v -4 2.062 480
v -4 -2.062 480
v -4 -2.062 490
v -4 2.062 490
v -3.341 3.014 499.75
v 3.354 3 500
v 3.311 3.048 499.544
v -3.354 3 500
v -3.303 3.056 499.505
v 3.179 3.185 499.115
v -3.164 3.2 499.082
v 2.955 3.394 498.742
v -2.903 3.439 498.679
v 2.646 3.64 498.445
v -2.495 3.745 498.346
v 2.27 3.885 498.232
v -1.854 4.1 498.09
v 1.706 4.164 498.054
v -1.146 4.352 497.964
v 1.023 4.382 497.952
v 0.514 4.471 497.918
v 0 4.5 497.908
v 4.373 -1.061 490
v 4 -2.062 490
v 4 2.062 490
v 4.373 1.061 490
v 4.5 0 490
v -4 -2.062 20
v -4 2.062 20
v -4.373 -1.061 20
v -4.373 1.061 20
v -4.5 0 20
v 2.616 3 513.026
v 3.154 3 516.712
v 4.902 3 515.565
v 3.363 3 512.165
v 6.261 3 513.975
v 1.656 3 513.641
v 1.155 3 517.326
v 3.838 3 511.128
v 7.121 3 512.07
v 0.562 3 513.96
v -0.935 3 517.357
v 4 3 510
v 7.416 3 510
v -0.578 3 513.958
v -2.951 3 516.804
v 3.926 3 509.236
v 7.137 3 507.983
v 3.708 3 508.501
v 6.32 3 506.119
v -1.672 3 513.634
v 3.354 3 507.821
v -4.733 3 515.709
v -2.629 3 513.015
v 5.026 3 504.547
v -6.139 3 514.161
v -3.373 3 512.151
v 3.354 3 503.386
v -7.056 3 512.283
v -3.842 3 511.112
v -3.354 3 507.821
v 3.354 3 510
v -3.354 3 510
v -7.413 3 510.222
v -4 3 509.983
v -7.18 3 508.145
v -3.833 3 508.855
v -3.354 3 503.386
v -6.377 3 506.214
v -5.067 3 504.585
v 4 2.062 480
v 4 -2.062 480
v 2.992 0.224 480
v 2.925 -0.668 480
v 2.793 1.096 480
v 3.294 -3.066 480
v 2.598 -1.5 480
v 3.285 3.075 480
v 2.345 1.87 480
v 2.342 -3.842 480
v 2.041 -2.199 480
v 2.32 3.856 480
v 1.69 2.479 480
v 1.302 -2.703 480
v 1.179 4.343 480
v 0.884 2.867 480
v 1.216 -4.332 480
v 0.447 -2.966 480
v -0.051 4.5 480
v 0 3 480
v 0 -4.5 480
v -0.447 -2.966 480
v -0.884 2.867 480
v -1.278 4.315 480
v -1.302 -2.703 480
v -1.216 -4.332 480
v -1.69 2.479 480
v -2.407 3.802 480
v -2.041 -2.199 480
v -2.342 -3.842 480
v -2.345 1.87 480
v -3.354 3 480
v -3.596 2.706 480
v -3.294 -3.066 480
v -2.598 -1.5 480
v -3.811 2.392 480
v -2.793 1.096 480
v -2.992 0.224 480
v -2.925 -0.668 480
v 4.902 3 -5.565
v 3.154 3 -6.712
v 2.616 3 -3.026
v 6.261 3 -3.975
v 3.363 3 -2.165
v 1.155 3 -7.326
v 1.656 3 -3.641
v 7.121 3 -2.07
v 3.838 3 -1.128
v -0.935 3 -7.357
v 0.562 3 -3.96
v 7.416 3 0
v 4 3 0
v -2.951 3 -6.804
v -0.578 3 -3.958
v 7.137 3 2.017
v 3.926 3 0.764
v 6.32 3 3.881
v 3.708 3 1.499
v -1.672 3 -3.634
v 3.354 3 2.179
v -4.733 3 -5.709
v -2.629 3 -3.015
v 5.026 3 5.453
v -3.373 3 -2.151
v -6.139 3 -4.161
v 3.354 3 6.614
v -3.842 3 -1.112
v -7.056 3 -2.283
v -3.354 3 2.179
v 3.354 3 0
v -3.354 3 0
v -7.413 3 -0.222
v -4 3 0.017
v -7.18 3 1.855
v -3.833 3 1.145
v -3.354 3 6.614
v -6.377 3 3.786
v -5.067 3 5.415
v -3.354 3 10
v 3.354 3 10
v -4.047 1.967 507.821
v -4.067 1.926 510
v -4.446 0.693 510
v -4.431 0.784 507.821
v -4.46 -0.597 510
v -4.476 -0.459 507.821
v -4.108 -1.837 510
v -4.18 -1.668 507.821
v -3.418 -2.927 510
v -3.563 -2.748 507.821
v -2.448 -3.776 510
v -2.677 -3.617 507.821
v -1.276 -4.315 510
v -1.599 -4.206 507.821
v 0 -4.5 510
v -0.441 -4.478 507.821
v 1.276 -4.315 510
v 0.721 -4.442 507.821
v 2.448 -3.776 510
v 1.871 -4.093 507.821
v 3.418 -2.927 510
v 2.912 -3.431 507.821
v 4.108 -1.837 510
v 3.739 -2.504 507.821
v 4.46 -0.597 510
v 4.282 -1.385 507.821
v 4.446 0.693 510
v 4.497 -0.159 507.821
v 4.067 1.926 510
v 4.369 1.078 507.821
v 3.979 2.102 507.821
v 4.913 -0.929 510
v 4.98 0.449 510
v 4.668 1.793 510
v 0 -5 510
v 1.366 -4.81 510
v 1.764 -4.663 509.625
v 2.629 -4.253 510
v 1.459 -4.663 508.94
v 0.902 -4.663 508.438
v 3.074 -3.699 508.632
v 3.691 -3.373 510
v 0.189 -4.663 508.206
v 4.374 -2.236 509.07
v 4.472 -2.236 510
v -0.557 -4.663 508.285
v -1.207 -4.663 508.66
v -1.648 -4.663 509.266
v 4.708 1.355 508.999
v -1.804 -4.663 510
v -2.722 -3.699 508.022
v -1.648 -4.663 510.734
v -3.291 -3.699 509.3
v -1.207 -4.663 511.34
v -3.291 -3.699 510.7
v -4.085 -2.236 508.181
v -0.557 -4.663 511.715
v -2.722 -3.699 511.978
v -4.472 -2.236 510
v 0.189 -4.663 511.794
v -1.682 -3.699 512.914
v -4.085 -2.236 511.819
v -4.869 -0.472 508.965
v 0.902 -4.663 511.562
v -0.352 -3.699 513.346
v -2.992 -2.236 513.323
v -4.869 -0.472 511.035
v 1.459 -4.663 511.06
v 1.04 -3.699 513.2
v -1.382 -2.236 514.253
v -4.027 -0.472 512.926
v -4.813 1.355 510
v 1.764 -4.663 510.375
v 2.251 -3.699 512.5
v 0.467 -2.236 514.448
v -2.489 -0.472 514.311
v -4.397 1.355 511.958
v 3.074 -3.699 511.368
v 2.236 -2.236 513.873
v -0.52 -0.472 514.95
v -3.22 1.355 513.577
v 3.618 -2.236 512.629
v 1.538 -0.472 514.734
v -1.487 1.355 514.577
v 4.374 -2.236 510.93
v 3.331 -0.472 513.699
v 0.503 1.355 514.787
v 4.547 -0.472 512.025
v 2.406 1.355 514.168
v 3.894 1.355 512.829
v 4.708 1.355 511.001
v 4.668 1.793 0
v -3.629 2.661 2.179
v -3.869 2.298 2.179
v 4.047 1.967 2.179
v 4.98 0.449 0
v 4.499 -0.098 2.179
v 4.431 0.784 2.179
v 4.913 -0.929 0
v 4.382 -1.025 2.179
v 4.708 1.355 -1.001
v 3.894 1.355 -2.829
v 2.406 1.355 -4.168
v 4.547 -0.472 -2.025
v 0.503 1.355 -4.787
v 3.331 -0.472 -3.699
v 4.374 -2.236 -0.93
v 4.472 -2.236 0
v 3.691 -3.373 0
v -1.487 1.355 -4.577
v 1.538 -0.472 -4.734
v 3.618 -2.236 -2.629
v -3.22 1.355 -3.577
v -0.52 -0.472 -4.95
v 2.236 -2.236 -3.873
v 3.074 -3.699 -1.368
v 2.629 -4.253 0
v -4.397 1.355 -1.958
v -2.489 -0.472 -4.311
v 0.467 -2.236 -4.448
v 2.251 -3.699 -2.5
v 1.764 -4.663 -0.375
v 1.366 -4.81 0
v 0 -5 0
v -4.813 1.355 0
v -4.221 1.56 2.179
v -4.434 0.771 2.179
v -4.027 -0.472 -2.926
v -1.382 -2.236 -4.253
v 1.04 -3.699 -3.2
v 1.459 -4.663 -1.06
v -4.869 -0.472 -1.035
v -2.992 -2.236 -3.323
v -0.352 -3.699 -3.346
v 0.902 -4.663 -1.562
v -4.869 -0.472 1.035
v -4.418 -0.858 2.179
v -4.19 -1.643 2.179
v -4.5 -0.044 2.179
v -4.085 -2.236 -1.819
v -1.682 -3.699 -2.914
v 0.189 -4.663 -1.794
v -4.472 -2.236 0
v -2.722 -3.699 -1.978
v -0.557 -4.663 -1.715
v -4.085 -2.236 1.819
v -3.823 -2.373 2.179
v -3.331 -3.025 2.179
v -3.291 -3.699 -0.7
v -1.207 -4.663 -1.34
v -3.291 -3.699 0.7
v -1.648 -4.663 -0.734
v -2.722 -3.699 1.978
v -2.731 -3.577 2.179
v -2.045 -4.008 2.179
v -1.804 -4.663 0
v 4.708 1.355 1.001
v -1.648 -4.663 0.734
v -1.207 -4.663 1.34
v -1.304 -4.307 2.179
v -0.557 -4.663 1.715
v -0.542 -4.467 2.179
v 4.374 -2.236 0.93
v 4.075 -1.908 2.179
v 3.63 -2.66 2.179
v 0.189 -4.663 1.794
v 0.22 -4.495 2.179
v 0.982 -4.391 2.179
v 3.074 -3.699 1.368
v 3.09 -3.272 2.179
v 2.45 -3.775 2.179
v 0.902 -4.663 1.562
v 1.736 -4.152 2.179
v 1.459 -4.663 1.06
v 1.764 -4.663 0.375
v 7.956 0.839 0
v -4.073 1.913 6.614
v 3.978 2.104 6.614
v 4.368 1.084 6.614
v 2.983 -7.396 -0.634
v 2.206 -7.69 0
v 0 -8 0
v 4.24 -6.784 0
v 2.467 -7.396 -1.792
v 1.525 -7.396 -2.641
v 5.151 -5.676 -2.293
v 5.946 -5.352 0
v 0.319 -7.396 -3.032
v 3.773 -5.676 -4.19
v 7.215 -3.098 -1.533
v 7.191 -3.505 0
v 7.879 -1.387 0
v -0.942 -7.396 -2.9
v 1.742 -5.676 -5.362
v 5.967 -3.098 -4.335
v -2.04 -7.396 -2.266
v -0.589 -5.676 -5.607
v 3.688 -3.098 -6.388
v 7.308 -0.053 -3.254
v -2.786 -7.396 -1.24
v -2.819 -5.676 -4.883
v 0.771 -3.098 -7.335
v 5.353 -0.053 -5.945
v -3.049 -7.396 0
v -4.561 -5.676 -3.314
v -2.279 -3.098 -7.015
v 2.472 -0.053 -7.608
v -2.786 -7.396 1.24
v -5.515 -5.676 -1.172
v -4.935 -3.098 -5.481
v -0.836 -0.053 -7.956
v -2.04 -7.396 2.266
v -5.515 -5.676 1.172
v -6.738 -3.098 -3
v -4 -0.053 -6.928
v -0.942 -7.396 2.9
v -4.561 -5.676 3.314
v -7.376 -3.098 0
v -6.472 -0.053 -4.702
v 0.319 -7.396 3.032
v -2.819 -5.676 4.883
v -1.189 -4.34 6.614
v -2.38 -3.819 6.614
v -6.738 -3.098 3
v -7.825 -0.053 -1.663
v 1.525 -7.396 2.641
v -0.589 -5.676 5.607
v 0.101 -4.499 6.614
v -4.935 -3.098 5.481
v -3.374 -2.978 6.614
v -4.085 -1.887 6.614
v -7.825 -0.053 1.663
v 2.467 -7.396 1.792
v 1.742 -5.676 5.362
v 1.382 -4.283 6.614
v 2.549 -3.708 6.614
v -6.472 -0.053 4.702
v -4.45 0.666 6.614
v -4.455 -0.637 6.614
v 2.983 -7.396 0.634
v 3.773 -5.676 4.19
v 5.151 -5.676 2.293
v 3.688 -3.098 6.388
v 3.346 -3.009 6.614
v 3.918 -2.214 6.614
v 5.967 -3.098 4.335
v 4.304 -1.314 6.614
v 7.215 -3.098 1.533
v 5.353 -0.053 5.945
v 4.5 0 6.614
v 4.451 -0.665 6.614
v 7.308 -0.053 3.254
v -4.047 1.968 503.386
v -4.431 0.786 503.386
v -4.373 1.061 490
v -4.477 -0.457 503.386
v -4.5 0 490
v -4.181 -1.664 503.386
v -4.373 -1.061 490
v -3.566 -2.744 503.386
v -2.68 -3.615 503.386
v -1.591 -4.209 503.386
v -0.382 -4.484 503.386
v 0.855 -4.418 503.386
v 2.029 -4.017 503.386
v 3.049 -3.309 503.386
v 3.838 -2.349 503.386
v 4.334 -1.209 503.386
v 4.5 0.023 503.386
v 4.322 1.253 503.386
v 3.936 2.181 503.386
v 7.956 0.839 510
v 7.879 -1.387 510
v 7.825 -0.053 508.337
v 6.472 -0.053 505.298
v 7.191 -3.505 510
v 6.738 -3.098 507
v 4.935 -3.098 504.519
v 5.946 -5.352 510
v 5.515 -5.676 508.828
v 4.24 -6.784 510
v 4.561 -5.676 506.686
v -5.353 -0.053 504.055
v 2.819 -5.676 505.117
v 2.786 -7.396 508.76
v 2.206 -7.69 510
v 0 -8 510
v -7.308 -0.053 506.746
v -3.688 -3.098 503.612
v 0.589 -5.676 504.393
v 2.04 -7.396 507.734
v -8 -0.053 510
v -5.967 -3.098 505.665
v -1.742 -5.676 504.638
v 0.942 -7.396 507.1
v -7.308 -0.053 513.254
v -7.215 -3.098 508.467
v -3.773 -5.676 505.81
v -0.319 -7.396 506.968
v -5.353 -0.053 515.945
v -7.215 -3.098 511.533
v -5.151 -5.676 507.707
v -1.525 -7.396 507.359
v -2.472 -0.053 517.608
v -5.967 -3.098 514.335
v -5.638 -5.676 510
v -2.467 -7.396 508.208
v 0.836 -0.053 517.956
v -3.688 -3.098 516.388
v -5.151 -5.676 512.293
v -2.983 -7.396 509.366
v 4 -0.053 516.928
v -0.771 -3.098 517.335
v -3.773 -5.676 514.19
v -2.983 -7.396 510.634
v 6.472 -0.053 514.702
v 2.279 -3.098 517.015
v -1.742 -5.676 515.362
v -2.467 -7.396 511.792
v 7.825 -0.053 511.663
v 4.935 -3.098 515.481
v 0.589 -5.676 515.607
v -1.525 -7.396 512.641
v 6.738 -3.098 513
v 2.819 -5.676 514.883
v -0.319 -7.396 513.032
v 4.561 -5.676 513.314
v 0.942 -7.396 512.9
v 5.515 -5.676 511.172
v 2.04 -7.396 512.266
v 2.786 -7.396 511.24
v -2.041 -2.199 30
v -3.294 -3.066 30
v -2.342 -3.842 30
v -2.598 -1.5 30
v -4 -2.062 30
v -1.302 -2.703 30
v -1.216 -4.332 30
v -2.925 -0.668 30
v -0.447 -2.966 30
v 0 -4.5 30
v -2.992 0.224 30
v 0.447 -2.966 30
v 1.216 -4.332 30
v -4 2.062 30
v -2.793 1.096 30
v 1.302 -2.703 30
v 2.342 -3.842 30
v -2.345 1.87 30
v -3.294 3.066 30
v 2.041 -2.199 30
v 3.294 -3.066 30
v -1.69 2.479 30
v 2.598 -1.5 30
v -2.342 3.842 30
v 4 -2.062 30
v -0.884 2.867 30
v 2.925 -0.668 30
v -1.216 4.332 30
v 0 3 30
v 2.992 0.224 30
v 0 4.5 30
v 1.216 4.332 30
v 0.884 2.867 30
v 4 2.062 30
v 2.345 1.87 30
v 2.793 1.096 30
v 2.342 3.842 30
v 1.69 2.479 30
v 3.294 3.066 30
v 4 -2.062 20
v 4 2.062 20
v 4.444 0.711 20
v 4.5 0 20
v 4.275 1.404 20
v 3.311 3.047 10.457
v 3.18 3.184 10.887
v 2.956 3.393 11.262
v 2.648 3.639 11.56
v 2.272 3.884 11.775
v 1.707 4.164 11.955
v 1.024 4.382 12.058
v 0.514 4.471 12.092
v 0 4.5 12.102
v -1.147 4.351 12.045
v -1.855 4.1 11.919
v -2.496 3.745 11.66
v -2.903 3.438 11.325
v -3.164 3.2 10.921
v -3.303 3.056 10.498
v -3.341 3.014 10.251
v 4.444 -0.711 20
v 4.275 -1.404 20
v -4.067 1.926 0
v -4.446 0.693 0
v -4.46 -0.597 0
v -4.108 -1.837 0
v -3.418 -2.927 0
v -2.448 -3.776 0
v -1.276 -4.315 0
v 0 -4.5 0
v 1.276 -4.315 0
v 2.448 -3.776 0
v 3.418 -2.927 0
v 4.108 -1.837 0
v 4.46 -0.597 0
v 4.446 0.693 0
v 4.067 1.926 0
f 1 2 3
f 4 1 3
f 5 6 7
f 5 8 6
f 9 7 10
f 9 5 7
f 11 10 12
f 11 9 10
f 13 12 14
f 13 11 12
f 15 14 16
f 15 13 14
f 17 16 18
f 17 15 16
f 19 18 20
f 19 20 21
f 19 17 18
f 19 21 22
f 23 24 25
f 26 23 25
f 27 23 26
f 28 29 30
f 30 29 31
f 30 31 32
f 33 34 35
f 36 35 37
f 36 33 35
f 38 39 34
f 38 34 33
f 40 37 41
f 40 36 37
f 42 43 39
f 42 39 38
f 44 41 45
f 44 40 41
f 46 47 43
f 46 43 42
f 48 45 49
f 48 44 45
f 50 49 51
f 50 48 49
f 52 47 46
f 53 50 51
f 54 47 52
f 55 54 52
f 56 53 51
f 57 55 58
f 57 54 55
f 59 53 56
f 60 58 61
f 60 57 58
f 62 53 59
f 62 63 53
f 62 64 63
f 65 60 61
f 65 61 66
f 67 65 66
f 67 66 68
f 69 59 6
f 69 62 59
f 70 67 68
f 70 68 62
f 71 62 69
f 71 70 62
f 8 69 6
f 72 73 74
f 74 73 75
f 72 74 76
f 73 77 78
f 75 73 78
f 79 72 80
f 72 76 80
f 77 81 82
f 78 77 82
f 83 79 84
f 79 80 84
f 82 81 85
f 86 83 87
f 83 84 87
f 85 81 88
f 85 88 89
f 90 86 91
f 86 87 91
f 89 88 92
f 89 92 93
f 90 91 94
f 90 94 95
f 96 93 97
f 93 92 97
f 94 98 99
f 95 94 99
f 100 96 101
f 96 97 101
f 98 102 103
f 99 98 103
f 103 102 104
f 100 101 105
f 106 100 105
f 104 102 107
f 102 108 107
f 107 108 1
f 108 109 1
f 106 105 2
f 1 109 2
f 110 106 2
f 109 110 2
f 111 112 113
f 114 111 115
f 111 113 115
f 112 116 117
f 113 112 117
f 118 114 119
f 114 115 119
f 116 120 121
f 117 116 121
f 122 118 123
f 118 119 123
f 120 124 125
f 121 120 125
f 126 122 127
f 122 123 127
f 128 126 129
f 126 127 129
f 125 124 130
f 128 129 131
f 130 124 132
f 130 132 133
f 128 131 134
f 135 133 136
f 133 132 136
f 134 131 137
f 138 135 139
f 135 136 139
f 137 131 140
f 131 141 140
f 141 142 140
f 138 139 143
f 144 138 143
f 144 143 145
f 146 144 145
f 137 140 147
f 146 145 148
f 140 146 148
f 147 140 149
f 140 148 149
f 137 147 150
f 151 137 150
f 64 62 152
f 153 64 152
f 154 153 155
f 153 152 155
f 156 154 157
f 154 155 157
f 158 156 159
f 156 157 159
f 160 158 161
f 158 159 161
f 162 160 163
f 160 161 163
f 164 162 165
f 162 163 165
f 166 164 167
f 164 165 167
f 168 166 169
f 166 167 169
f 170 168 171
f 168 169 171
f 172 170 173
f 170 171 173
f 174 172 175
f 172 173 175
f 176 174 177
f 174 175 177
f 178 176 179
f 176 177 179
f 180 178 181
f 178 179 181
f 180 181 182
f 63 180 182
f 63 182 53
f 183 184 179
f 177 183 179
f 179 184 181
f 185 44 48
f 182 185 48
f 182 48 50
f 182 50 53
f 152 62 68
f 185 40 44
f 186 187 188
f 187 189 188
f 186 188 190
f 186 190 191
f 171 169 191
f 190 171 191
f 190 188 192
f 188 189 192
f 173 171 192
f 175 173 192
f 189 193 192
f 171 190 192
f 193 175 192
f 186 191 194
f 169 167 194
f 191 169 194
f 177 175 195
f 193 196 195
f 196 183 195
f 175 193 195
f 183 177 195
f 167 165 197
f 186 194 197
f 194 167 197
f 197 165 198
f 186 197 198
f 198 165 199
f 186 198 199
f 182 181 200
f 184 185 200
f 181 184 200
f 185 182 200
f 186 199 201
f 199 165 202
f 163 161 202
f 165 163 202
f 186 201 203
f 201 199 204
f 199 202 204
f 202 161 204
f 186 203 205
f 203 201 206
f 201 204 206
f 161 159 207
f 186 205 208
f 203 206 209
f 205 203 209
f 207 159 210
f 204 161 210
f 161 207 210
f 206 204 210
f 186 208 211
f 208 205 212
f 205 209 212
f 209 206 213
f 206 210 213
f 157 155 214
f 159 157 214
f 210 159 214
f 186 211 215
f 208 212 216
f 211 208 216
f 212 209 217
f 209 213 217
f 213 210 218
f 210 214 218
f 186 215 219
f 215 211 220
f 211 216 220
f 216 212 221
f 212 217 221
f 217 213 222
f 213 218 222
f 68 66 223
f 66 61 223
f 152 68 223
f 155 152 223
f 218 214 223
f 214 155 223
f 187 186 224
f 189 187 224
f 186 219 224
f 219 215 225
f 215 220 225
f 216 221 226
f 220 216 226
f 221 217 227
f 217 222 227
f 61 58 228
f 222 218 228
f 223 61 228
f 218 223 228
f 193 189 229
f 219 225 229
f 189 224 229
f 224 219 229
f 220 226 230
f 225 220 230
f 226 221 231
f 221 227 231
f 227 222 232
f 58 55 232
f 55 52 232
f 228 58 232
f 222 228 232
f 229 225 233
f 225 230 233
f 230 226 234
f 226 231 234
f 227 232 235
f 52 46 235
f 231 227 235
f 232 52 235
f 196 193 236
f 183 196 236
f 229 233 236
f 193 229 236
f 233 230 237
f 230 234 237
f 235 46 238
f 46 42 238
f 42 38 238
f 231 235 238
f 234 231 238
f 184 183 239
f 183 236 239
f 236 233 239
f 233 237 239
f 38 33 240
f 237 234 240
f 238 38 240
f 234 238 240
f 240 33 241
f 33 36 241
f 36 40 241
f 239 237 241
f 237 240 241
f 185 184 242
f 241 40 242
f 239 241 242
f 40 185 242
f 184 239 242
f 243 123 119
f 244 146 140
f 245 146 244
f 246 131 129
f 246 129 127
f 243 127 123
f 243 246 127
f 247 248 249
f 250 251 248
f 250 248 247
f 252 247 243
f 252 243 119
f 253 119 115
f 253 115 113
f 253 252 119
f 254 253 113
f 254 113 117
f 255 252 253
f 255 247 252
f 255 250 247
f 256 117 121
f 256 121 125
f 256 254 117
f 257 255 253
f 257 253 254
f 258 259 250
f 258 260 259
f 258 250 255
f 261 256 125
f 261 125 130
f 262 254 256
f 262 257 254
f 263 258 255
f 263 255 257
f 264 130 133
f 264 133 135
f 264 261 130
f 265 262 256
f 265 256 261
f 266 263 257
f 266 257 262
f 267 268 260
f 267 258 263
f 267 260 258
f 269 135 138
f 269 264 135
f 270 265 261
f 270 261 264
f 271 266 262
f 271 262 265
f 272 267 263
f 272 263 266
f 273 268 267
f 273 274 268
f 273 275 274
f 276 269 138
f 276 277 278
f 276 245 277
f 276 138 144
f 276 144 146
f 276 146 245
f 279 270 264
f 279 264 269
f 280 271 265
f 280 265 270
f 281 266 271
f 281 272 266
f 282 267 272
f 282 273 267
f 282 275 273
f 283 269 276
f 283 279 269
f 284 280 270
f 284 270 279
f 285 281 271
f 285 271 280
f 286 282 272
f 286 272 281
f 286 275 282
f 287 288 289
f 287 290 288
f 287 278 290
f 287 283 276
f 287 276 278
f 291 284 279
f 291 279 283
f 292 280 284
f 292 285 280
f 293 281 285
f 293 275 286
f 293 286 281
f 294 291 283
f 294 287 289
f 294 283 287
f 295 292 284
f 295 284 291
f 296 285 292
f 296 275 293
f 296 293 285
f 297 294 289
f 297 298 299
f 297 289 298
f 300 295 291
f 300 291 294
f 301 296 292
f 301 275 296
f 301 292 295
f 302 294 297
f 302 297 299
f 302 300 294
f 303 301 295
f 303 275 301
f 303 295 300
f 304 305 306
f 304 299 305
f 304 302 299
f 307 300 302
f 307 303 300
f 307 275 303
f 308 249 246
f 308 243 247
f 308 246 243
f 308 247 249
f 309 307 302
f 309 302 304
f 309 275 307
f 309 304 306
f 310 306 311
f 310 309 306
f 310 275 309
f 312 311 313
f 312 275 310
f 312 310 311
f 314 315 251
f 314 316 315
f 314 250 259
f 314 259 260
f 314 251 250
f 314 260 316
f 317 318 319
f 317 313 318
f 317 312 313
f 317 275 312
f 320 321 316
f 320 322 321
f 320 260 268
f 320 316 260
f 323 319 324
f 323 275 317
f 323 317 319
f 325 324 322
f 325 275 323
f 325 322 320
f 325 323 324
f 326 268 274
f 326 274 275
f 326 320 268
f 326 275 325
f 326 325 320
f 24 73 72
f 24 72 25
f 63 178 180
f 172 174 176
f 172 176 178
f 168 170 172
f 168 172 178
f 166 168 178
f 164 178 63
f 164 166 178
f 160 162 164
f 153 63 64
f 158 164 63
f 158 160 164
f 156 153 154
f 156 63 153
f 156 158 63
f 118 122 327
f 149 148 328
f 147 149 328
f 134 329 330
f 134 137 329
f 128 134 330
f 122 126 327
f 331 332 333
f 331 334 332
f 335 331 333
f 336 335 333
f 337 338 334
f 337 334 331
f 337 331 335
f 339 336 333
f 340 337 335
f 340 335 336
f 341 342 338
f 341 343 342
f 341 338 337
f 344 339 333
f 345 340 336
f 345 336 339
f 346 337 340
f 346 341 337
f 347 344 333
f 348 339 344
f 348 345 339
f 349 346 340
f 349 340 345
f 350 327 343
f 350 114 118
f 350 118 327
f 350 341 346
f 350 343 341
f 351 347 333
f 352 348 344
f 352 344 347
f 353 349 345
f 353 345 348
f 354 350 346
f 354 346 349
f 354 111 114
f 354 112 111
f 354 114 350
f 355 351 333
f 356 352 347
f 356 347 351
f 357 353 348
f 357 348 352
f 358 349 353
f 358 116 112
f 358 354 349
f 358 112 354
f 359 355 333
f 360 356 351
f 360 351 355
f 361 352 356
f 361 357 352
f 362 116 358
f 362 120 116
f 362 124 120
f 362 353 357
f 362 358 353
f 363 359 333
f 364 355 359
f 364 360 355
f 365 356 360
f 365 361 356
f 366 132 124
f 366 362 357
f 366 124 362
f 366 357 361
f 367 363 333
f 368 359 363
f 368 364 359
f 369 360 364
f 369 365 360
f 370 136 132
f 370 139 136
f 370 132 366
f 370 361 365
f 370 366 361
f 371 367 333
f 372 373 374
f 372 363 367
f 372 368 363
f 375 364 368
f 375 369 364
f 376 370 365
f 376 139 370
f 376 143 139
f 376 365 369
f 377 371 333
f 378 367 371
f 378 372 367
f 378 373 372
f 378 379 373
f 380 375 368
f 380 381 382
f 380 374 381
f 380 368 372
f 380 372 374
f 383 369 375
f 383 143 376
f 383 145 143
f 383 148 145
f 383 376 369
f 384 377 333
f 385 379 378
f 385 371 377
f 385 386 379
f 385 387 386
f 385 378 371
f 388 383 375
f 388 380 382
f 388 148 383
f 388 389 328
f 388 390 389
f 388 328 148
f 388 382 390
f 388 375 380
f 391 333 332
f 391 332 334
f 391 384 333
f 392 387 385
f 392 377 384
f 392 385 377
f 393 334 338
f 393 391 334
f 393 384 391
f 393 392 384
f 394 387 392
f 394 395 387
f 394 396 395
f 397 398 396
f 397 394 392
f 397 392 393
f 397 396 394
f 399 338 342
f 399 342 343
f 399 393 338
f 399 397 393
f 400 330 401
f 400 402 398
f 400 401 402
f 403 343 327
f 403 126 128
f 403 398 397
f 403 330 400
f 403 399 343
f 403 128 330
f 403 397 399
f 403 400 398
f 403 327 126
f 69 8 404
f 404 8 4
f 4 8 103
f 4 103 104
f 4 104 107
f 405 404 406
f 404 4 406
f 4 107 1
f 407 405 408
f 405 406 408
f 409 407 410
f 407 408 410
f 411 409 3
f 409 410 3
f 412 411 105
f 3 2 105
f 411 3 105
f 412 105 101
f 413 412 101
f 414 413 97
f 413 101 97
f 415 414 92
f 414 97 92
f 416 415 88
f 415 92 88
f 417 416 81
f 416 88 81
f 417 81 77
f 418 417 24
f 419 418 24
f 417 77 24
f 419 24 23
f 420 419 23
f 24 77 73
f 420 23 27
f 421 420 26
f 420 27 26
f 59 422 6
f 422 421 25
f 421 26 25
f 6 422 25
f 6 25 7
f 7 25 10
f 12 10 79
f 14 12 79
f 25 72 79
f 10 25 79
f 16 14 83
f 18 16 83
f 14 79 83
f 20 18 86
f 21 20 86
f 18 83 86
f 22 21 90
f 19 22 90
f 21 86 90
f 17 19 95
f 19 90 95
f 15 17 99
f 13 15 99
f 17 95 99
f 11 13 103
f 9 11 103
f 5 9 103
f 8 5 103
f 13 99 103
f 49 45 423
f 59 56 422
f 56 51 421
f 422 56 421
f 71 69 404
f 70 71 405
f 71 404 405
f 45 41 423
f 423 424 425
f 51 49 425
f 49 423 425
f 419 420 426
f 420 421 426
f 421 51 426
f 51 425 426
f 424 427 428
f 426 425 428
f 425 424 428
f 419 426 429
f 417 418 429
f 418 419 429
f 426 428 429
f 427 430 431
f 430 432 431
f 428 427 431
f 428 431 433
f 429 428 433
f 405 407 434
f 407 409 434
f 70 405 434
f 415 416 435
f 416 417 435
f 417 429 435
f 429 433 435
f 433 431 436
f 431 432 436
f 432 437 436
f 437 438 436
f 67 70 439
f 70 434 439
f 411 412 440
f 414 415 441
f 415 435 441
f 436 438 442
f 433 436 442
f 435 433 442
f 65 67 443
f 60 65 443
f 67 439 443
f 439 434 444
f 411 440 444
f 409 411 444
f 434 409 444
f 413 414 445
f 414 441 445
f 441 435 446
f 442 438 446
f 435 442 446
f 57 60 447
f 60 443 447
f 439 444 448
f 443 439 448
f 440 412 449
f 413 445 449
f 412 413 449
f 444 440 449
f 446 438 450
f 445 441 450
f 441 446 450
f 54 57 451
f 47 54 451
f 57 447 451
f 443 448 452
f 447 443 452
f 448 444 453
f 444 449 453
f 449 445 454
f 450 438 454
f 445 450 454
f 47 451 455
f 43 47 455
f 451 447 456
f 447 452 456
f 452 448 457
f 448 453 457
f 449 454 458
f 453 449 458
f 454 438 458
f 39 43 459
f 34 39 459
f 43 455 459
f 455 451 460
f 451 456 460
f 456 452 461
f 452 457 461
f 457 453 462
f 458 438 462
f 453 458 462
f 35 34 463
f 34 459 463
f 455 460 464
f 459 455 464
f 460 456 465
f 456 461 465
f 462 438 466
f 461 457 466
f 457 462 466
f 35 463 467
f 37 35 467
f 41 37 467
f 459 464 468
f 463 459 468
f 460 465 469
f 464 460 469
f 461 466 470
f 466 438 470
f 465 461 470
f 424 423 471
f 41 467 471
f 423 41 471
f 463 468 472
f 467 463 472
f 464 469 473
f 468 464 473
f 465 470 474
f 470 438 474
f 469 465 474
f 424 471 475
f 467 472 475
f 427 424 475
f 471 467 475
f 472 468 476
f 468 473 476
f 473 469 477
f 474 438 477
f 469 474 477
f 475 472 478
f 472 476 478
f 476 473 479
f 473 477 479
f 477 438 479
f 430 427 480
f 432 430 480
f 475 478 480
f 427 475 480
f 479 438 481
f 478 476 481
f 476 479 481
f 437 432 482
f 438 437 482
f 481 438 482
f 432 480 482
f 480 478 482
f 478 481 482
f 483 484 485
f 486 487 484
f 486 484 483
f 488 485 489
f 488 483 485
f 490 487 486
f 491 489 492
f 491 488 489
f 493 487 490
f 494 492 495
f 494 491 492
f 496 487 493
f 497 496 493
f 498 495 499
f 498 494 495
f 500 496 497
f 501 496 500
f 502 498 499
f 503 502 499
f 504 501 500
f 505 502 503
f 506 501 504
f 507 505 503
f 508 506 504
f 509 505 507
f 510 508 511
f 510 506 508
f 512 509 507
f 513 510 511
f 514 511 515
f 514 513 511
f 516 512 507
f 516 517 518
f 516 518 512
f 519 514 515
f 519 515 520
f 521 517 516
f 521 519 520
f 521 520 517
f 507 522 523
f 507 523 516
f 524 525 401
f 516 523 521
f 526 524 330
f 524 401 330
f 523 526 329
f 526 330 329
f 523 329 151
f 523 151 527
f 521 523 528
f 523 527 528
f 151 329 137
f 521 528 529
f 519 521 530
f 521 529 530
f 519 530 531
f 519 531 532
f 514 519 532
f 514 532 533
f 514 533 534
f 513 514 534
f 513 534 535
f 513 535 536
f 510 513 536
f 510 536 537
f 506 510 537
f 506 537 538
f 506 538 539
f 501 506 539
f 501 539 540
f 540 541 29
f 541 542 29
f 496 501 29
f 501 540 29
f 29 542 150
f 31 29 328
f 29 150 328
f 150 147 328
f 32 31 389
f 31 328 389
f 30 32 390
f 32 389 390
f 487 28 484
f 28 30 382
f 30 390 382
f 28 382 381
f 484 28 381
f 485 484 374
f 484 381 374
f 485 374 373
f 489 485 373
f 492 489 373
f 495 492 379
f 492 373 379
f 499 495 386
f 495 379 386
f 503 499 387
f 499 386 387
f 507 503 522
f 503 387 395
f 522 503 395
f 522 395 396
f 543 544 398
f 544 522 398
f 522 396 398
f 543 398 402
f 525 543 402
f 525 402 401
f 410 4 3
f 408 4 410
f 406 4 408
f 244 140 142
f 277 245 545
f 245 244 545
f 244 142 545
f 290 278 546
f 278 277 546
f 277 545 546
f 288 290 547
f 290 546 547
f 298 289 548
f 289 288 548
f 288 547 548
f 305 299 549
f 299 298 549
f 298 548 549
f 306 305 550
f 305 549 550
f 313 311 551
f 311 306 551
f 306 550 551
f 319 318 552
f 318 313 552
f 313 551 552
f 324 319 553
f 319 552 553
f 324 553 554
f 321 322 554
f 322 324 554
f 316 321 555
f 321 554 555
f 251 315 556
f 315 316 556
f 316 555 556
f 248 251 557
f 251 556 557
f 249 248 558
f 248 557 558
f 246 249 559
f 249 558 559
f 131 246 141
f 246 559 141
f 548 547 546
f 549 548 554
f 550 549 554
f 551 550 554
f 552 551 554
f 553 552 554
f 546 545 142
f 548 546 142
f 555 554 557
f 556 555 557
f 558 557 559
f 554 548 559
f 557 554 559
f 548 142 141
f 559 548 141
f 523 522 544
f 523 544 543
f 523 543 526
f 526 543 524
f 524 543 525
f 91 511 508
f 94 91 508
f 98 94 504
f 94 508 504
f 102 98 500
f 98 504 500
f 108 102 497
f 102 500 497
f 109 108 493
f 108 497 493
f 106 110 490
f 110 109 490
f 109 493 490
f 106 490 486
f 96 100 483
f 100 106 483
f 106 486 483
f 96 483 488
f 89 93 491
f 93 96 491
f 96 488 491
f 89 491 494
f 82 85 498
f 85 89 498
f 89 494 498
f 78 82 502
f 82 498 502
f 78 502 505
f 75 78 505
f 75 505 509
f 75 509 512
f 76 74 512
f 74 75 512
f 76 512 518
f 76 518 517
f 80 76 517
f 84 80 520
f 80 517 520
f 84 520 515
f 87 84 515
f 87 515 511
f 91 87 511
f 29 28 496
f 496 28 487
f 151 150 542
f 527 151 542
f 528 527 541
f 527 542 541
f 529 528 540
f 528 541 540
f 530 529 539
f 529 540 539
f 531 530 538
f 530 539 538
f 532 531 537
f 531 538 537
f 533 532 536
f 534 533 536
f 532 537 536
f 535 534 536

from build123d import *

# Parameters (mm, degrees)
SKETCH_2_R               = 3
EXTRUDE_1_DEPTH          = 510
SKETCH_7_R               = 4.5
EXTRUDE_2_DEPTH          = 30
CUT_EXTRUDE_1_DEPTH      = 519.123537392
CUT_EXTRUDE_1_DEPTH_BACK = 519.123537392
EXTRUDE_START            = -30
SKETCH_9_R               = 4.5
EXTRUDE_3_DEPTH          = 30
CUT_EXTRUDE_2_DEPTH      = 30
CUT_EXTRUDE_2_DEPTH_BACK = 30
CUT_EXTRUDE_3_DEPTH      = 30
CUT_EXTRUDE_3_DEPTH_BACK = 30
SKETCH_11_W              = 5.925666616
SKETCH_11_H              = 14.898307071
SKETCH_11_W_2            = 6.139683371
SKETCH_11_W_3            = 15.578698717
SKETCH_11_H_2            = 21.382269556
SKETCH_11_W_4            = 12.448960945


with BuildPart() as part:
    # 草图1 → 旋转4 (revolve)
    with BuildSketch(Plane.XY):
        with BuildLine():
            Line((-7.416198487, 3), (-4, 3))
            ThreePointArc((-4, 3), (-4.472135955, -2.236067977), (0, -5))
            Line((0, -5), (0, -8))
            ThreePointArc((0, -8), (-6.633249581, -4.472135955), (-7.416198487, 3))
        make_face()
    revolve(axis=Axis((0, -1000, 0), (0, 1, 0)))

    # 草图2 → 拉伸1 (add)
    with BuildSketch(Plane.XY):
        Circle(SKETCH_2_R)
    extrude(amount=EXTRUDE_1_DEPTH)

    # 草图4 → 切除-旋转1 (revolve, cut)
    with BuildSketch(Plane.XY):
        with BuildLine():
            Line((0, -5), (0, 5))
            ThreePointArc((0, 5), (-5, 0), (0, -5))
        make_face()
    revolve(axis=Axis((0, -1000, 0), (0, 1, 0)), mode=Mode.SUBTRACT)

    # 草图6 → 旋转6 (revolve)
    with BuildSketch(Plane.XY.offset(510)):
        with BuildLine():
            Line((-4, 3), (-7.416198487, 3))
            ThreePointArc((-7.416198487, 3), (-6.633249581, -4.472135955), (0, -8))
            Line((0, -8), (0, -5))
            ThreePointArc((0, -5), (-4.472135955, -2.236067978), (-4, 3))
        make_face()
    revolve(axis=Axis((0, -1000, 510), (0, 1, 0)))

    # 草图7 → 拉伸2 (add)
    with BuildSketch(Plane.XY):
        Circle(SKETCH_7_R)
    extrude(amount=EXTRUDE_2_DEPTH)

    # 草图8 → 切除-拉伸1 (cut, two sides: drawn at the far end of the back side and taken through both)
    with BuildSketch(Plane(origin=(0, 0, 0), x_dir=(0, 0, -1), z_dir=(1, 0, 0)).offset(-CUT_EXTRUDE_1_DEPTH_BACK)):
        with BuildLine():
            Line((7.416198487, 3), (-10, 3))
            ThreePointArc((-10, 3), (-11.291313525, 3.41344103), (-12.102370681, 4.5))
            Line((-12.102370681, 4.5), (0, 4.5))
            Line((0, 4.5), (7.416198487, 3))
        make_face()
    extrude(amount=CUT_EXTRUDE_1_DEPTH + CUT_EXTRUDE_1_DEPTH_BACK, mode=Mode.SUBTRACT)

    # 草图9 → 拉伸3 (add)
    with BuildSketch(Plane.XY.offset(510).offset(EXTRUDE_START)):
        Circle(SKETCH_9_R)
    extrude(amount=EXTRUDE_3_DEPTH)

    # 草图10 → 切除-拉伸2 (cut, two sides: drawn at the far end of the back side and taken through both)
    with BuildSketch(Plane(origin=(0, 0, 0), x_dir=(0, 0, -1), z_dir=(1, 0, 0)).offset(-CUT_EXTRUDE_2_DEPTH_BACK)):
        with BuildLine():
            Line((-522.263931155, 3), (-500, 3))
            ThreePointArc((-500, 3), (-498.712997614, 3.413758441), (-497.908230279, 4.5))
            Line((-497.908230279, 4.5), (-522.188391586, 4.5))
            Line((-522.188391586, 4.5), (-522.263931155, 3))
        make_face()
    extrude(amount=CUT_EXTRUDE_2_DEPTH + CUT_EXTRUDE_2_DEPTH_BACK, mode=Mode.SUBTRACT)

    # 草图11 → 切除-拉伸3 (cut, two sides: drawn at the far end of the back side and taken through both)
    with BuildSketch(Plane(origin=(0, 3, 0), x_dir=(-1, 0, 0), z_dir=(0, 1, 0)).offset(-CUT_EXTRUDE_3_DEPTH_BACK)):
        with Locations((-6.962833308, 482.550846465)):
            Rectangle(SKETCH_11_W, SKETCH_11_H)
        with Locations((7.069841686, 482.550846465)):
            Rectangle(SKETCH_11_W_2, SKETCH_11_H)
        with Locations((-11.789349359, 30.691134778)):
            Rectangle(SKETCH_11_W_3, SKETCH_11_H_2)
        with Locations((10.224480472, 30.691134778)):
            Rectangle(SKETCH_11_W_4, SKETCH_11_H_2)
    extrude(amount=CUT_EXTRUDE_3_DEPTH + CUT_EXTRUDE_3_DEPTH_BACK, mode=Mode.SUBTRACT)


solid = part.part
